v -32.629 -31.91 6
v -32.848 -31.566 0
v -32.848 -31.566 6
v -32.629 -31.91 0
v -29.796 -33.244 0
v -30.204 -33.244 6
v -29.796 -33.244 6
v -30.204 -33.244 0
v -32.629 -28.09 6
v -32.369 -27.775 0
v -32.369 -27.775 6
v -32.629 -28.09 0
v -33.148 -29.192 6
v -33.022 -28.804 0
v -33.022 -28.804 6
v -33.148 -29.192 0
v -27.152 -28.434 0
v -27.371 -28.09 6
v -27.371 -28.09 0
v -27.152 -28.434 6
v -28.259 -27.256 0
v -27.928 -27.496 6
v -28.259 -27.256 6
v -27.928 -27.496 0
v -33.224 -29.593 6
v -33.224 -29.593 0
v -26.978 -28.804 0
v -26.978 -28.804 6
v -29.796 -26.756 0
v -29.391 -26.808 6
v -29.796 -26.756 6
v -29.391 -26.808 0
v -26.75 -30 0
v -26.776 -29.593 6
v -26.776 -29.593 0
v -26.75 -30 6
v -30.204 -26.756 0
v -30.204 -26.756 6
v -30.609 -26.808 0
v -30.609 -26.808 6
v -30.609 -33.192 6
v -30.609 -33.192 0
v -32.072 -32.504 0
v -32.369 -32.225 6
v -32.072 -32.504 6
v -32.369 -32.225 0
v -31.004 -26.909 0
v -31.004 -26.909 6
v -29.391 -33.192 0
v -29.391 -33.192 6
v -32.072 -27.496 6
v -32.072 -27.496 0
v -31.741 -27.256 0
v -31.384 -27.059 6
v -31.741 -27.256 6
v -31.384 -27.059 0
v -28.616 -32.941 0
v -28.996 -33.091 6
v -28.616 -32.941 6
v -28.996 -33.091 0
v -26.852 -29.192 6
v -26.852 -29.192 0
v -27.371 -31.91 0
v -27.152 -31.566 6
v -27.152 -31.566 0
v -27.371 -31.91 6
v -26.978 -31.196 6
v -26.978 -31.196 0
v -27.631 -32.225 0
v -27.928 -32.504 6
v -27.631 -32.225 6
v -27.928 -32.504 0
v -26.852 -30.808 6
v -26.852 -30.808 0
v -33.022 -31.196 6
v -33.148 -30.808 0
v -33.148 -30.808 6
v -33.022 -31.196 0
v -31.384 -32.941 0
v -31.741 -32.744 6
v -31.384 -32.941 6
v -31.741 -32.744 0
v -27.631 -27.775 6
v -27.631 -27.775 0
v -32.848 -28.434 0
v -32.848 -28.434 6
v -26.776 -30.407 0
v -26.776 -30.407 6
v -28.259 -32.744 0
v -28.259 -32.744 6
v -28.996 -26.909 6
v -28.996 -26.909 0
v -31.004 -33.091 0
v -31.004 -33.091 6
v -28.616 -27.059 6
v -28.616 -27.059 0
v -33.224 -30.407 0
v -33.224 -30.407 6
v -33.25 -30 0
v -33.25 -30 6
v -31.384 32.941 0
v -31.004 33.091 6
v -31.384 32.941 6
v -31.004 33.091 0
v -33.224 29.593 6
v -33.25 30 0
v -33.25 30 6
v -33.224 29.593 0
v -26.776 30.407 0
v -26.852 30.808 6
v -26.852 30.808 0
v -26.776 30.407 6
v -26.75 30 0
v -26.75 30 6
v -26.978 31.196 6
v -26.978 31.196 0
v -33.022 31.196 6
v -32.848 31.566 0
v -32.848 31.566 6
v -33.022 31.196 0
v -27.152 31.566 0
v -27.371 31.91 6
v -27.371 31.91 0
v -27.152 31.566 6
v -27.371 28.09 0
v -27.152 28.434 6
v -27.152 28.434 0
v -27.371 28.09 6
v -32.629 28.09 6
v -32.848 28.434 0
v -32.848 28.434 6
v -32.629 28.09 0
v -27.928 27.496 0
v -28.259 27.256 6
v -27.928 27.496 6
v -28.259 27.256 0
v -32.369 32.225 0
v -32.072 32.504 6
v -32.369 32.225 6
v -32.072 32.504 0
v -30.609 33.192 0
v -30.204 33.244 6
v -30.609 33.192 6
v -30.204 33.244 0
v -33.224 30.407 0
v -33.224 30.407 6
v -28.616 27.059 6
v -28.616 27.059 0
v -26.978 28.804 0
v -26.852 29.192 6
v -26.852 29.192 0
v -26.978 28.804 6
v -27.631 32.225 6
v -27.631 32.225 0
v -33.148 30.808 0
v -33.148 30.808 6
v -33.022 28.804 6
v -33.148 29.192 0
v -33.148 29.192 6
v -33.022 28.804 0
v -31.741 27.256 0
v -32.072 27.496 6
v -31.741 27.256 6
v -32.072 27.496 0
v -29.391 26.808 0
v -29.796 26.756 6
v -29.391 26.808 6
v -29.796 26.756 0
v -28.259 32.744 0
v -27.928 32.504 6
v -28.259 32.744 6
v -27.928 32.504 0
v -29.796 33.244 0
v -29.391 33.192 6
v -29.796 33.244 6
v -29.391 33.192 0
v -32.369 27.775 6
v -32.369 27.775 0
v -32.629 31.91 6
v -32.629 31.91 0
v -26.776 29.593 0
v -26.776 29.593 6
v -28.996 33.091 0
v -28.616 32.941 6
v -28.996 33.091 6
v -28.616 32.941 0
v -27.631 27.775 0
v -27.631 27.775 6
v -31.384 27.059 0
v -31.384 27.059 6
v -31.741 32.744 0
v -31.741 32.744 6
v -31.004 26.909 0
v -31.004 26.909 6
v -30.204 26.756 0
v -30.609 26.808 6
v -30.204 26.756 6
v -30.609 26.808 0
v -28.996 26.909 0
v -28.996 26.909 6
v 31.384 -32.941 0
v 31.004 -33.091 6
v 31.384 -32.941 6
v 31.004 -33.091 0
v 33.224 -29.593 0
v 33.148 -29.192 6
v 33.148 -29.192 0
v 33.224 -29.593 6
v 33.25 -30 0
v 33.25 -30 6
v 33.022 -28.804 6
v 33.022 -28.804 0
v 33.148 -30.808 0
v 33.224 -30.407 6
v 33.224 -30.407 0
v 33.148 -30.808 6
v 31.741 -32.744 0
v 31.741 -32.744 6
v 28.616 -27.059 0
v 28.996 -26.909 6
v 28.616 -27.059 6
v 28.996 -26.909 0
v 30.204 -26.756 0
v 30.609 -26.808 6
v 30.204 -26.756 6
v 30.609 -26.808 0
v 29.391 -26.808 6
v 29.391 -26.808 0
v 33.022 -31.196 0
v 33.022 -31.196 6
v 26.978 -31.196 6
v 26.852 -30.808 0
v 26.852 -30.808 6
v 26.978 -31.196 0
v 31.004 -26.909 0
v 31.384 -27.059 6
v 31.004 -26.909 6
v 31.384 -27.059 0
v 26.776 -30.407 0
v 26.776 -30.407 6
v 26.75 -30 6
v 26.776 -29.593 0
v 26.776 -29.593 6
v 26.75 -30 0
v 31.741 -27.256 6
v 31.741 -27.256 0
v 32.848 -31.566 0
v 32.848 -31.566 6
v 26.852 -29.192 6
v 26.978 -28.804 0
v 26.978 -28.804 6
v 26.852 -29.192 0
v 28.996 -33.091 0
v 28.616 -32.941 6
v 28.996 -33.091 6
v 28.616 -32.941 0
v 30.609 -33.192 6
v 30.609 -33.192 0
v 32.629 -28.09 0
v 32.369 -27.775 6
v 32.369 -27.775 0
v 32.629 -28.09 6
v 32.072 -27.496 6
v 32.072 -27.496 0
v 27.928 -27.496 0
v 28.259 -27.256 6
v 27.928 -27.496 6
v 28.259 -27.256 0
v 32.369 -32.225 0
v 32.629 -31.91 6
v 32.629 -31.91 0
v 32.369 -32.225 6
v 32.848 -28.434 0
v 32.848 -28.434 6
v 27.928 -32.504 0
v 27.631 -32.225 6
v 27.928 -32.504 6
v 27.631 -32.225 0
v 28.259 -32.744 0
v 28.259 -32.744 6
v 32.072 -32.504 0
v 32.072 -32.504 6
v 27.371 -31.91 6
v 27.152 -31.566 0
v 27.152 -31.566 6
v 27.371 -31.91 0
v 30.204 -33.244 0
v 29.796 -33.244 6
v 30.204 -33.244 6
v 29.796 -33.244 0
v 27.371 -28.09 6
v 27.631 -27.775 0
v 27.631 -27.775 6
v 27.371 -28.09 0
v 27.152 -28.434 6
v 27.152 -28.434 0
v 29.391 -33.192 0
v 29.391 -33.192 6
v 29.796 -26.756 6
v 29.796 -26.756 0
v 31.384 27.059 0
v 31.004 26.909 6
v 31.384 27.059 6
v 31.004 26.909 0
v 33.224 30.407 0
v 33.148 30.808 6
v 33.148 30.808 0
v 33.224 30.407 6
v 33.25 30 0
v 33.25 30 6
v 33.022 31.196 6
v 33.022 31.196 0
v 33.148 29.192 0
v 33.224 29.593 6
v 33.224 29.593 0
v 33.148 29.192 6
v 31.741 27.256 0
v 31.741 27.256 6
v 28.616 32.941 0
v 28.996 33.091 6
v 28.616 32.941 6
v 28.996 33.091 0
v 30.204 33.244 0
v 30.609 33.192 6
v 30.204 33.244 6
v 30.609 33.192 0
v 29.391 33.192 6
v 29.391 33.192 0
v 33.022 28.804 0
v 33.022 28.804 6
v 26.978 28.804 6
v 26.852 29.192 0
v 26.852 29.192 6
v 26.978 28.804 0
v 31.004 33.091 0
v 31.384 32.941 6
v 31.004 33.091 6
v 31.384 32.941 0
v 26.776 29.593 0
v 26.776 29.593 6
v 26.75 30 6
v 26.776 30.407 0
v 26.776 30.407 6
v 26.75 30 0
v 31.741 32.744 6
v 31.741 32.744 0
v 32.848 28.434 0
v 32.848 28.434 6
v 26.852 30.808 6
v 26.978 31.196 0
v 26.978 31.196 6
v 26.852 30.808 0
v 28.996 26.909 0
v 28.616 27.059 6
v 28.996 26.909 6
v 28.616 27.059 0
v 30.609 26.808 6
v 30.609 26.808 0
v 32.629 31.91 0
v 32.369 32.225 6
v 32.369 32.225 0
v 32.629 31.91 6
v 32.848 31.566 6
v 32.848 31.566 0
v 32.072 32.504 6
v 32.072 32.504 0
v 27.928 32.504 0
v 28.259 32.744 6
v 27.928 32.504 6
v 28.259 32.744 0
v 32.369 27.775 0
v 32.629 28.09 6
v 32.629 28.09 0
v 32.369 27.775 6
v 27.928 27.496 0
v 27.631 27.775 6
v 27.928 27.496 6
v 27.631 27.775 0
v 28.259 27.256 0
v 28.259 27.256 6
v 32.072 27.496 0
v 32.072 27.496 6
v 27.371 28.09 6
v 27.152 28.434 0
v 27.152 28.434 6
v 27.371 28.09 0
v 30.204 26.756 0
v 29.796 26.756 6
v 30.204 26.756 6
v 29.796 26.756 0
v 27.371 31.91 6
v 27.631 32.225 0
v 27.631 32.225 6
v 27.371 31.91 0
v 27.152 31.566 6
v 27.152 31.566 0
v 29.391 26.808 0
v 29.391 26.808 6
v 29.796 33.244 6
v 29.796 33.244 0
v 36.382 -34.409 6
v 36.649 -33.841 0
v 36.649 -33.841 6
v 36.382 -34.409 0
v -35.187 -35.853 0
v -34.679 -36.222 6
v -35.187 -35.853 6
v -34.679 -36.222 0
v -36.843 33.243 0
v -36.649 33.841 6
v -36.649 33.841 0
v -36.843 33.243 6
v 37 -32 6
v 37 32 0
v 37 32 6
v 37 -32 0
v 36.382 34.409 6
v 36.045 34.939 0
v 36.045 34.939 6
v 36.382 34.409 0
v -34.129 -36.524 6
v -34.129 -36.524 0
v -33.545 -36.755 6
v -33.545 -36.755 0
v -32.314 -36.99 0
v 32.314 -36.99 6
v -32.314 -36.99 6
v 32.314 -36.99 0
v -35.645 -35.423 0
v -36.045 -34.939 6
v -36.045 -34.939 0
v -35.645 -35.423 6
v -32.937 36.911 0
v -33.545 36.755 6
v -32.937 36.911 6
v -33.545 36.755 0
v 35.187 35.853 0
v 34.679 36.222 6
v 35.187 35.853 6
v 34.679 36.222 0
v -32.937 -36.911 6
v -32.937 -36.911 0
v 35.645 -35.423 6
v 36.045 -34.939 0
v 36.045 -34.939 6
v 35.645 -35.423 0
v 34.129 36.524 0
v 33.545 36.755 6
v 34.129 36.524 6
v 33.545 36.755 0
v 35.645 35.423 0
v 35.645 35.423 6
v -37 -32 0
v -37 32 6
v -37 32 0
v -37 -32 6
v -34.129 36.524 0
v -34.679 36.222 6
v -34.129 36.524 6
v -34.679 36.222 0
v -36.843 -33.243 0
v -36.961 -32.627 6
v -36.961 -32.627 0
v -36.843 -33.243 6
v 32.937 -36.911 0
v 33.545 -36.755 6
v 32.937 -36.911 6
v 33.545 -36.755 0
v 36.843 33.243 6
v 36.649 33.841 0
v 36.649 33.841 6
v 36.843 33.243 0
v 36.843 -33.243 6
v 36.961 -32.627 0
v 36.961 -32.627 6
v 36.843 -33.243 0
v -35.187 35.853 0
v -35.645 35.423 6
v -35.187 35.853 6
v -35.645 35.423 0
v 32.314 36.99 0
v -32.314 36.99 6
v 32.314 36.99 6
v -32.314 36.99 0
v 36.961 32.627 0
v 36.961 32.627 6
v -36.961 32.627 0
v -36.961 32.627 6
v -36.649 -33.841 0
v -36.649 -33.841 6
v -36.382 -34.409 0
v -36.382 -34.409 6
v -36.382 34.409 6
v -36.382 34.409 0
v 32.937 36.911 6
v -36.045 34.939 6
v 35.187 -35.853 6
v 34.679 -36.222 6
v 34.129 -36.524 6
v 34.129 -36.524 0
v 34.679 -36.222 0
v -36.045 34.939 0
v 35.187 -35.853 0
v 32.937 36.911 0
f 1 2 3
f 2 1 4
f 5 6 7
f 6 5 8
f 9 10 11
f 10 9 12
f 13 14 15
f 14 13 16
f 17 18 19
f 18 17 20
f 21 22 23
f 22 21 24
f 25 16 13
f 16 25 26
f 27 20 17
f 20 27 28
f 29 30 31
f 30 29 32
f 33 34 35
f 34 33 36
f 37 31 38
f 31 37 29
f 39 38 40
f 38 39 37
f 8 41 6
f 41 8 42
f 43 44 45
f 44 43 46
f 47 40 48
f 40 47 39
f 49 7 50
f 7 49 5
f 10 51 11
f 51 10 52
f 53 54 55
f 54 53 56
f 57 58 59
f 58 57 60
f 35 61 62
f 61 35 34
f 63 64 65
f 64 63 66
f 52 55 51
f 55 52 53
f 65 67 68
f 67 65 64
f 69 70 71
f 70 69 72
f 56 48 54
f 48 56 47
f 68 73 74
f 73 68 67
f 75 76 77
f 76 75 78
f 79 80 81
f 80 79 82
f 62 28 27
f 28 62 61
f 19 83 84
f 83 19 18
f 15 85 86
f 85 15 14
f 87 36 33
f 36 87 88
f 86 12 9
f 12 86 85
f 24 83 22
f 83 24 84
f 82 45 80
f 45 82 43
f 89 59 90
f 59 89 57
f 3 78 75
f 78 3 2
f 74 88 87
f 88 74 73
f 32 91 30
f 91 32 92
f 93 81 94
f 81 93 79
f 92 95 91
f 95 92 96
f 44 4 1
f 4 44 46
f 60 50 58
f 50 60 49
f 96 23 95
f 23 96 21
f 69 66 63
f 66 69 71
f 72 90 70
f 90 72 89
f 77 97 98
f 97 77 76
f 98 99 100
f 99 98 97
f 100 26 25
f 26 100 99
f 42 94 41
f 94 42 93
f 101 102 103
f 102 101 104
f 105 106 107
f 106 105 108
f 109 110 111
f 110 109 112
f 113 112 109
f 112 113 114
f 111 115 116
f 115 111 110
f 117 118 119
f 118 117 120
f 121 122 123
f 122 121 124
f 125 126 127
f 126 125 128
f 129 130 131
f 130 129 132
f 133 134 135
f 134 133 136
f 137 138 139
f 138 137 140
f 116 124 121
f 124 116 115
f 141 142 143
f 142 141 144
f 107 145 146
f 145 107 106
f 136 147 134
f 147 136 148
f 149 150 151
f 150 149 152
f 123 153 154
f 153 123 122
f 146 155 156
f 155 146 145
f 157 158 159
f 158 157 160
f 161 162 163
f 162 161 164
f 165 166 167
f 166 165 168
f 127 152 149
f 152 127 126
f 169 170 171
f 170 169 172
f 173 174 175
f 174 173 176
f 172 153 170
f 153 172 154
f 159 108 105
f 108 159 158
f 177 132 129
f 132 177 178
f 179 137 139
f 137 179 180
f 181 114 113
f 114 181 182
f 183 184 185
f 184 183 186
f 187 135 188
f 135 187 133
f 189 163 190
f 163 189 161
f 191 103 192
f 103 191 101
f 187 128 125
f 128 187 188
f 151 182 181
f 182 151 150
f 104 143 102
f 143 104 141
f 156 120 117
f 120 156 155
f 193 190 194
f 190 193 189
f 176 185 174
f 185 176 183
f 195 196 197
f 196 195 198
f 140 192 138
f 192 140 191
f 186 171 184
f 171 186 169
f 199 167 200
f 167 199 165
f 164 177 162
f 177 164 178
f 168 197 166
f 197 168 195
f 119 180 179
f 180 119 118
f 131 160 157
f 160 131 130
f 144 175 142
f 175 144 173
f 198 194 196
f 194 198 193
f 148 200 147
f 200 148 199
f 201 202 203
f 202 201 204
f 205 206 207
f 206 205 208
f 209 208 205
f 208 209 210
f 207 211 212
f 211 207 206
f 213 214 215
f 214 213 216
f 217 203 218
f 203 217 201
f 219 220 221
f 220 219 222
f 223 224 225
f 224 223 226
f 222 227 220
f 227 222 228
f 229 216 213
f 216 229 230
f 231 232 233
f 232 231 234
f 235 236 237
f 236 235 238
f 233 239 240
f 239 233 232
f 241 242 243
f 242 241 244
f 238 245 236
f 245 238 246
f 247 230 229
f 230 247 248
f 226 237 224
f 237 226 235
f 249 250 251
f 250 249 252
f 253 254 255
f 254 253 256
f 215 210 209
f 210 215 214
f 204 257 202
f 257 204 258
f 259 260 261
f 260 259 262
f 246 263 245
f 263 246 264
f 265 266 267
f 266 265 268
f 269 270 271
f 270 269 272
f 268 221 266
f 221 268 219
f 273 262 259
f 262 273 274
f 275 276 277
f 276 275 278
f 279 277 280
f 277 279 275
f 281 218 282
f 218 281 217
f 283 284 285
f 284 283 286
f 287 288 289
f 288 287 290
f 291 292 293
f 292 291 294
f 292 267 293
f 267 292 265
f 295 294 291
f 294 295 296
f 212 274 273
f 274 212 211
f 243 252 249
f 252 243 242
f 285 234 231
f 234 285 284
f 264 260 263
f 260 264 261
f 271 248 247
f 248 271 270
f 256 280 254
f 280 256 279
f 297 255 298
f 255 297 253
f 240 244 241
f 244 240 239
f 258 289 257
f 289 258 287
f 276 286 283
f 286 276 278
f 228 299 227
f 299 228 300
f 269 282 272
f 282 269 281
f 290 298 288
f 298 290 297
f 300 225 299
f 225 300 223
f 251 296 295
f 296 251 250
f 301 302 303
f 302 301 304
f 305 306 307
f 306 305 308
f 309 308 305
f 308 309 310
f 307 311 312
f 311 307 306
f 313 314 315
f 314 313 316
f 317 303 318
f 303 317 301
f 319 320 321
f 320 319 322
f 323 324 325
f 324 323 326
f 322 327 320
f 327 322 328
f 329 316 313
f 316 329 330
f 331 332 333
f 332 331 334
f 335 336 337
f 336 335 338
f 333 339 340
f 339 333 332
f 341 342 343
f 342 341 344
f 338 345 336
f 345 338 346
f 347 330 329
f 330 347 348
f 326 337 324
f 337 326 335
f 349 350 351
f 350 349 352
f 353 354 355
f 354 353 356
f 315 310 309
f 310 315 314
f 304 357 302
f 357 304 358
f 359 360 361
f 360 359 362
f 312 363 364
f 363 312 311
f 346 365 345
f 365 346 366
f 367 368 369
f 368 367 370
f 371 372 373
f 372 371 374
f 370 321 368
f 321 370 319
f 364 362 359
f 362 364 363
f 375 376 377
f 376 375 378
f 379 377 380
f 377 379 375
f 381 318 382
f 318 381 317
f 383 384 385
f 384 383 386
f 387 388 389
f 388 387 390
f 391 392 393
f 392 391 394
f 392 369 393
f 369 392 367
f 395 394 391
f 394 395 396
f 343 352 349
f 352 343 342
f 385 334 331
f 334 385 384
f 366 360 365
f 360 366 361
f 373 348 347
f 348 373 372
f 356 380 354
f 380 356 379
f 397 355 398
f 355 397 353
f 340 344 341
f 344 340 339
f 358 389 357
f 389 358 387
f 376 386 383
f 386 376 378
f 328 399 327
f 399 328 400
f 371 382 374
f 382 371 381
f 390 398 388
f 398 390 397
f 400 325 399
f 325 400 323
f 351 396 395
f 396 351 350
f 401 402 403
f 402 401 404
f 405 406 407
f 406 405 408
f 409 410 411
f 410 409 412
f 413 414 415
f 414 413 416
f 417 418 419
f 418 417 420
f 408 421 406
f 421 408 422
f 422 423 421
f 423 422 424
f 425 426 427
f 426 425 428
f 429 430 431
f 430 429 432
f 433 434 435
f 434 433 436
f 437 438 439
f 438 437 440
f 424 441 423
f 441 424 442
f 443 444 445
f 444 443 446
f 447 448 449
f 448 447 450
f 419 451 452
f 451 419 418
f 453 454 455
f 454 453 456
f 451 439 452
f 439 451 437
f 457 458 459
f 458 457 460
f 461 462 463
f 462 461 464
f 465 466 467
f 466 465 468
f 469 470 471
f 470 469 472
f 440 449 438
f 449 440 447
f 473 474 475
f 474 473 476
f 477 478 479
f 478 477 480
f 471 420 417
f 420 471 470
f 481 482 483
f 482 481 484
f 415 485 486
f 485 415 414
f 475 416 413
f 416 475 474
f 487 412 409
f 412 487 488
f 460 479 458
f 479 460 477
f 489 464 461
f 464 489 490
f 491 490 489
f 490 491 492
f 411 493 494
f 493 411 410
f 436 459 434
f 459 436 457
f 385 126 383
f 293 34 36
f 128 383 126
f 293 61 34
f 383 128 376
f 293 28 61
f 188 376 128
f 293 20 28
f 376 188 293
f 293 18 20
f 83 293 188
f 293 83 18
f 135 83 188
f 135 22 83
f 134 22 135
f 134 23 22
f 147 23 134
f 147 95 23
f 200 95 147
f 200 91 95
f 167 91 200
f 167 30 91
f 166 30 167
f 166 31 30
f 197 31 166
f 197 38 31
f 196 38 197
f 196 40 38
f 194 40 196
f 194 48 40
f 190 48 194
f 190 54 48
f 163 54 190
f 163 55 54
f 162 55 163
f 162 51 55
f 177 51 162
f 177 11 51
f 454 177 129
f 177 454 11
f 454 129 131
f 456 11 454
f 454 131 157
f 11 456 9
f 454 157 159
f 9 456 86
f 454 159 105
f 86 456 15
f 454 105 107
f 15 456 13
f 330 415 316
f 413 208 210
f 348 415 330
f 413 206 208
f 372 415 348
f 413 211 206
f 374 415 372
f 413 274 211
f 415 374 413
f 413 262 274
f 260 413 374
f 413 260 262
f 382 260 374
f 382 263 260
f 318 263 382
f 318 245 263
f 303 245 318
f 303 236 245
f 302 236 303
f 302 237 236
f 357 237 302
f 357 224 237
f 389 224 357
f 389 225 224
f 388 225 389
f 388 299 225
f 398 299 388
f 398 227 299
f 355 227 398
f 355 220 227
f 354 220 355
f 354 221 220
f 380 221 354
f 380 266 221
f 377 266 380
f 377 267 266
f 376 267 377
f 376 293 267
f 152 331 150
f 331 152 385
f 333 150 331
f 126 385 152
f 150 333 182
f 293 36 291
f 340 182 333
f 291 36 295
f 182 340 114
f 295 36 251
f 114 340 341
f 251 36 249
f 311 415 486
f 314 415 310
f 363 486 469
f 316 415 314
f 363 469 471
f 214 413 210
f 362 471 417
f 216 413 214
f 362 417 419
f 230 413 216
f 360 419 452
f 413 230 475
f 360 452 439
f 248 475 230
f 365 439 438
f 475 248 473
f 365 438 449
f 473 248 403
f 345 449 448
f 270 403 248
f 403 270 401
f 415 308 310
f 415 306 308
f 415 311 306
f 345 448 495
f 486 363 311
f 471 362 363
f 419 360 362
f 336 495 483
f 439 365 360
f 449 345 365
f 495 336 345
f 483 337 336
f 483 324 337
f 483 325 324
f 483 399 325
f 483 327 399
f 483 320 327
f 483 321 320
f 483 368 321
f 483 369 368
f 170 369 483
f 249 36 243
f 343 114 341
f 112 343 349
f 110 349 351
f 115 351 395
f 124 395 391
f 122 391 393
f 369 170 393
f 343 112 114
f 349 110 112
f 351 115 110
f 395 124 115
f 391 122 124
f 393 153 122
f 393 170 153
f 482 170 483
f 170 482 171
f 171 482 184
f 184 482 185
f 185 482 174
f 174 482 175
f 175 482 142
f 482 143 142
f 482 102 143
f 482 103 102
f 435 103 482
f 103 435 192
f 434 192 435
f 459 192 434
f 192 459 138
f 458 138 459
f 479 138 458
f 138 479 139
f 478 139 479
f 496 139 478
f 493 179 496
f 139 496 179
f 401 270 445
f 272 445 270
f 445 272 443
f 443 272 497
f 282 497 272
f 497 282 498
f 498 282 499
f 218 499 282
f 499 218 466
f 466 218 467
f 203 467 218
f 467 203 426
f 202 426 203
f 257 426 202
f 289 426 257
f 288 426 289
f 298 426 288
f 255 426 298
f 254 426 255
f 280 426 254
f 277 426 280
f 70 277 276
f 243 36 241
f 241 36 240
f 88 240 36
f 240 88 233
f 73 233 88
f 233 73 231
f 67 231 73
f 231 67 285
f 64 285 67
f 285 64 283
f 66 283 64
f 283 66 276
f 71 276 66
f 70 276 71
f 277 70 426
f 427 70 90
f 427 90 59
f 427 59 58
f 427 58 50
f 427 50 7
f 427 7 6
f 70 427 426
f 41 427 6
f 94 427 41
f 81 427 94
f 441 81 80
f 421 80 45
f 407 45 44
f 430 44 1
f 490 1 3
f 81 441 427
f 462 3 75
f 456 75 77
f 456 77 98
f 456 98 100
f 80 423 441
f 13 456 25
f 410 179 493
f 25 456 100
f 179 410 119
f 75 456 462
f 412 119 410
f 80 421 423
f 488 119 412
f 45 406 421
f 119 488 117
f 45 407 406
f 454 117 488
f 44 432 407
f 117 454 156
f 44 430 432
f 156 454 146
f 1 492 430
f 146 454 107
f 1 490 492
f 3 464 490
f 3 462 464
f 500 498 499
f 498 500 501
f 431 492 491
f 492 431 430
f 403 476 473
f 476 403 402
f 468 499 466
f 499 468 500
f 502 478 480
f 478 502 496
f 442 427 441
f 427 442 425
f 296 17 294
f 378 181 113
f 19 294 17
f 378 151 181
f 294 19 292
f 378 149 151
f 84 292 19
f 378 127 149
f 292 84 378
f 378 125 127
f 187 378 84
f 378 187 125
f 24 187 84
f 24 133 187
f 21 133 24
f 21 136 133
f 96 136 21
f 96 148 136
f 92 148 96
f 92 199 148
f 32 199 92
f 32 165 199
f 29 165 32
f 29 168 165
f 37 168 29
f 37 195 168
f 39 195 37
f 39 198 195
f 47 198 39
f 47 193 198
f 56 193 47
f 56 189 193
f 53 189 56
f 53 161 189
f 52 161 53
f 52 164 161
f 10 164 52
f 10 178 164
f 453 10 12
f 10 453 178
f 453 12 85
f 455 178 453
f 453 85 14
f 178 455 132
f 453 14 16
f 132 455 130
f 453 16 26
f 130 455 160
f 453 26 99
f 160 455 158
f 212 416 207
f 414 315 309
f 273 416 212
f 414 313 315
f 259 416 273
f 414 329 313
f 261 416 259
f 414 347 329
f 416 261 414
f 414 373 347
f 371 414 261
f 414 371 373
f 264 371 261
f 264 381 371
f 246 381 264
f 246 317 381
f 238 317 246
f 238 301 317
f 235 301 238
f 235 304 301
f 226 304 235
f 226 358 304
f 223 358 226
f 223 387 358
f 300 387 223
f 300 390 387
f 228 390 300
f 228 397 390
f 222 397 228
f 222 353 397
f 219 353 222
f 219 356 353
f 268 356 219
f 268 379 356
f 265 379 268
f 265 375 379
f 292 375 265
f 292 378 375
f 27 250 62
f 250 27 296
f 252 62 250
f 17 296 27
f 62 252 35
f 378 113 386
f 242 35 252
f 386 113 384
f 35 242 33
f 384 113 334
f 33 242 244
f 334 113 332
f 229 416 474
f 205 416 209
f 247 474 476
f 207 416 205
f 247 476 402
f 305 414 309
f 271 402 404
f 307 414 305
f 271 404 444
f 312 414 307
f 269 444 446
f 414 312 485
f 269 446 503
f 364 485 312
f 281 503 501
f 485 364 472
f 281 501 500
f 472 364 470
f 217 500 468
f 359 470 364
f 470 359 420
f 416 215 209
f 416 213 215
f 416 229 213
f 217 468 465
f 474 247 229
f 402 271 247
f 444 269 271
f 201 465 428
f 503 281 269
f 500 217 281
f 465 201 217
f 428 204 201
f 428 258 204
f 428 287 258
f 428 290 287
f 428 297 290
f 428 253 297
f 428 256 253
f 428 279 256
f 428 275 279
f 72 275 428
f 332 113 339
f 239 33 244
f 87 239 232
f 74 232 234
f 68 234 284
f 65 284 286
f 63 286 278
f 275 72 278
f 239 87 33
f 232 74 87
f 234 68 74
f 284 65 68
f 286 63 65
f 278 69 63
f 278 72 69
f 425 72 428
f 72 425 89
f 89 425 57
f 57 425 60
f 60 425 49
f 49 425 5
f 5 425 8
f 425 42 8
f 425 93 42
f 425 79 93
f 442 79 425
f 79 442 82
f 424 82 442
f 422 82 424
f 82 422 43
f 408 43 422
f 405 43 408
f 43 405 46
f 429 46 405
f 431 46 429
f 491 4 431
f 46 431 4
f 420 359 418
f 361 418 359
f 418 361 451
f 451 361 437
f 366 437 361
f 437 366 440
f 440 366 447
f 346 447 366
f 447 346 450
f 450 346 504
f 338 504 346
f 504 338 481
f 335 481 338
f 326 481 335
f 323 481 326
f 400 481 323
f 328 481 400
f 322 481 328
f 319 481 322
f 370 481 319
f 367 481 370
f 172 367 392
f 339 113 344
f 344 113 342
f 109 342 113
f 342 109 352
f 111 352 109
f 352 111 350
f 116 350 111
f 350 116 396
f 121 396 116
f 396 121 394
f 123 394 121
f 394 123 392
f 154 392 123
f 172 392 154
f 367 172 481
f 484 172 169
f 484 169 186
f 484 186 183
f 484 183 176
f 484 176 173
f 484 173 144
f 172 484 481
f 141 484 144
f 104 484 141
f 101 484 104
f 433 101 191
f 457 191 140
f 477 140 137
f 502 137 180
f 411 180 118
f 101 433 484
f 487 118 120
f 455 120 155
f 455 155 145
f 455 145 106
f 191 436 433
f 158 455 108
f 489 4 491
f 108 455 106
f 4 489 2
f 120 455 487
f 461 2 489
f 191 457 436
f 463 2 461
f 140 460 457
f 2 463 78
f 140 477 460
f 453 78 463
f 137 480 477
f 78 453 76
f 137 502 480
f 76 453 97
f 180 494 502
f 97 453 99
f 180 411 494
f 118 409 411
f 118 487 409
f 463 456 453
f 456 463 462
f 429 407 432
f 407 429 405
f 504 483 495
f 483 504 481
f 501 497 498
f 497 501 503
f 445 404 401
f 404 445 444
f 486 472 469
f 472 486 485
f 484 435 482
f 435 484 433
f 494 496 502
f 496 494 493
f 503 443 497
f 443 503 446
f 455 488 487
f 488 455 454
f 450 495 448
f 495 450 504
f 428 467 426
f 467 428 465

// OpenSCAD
$fn = 50;


difference() {
	union() {
		hull() {
			translate(v = [-32.0000000000, 32.0000000000, 0]) {
				cylinder(h = 6, r = 5);
			}
			translate(v = [32.0000000000, 32.0000000000, 0]) {
				cylinder(h = 6, r = 5);
			}
			translate(v = [-32.0000000000, -32.0000000000, 0]) {
				cylinder(h = 6, r = 5);
			}
			translate(v = [32.0000000000, -32.0000000000, 0]) {
				cylinder(h = 6, r = 5);
			}
		}
	}
	union() {
		translate(v = [-30.0000000000, -30.0000000000, -100.0000000000]) {
			cylinder(h = 200, r = 3.2500000000);
		}
		translate(v = [-30.0000000000, 30.0000000000, -100.0000000000]) {
			cylinder(h = 200, r = 3.2500000000);
		}
		translate(v = [30.0000000000, -30.0000000000, -100.0000000000]) {
			cylinder(h = 200, r = 3.2500000000);
		}
		translate(v = [30.0000000000, 30.0000000000, -100.0000000000]) {
			cylinder(h = 200, r = 3.2500000000);
		}
	}
}
